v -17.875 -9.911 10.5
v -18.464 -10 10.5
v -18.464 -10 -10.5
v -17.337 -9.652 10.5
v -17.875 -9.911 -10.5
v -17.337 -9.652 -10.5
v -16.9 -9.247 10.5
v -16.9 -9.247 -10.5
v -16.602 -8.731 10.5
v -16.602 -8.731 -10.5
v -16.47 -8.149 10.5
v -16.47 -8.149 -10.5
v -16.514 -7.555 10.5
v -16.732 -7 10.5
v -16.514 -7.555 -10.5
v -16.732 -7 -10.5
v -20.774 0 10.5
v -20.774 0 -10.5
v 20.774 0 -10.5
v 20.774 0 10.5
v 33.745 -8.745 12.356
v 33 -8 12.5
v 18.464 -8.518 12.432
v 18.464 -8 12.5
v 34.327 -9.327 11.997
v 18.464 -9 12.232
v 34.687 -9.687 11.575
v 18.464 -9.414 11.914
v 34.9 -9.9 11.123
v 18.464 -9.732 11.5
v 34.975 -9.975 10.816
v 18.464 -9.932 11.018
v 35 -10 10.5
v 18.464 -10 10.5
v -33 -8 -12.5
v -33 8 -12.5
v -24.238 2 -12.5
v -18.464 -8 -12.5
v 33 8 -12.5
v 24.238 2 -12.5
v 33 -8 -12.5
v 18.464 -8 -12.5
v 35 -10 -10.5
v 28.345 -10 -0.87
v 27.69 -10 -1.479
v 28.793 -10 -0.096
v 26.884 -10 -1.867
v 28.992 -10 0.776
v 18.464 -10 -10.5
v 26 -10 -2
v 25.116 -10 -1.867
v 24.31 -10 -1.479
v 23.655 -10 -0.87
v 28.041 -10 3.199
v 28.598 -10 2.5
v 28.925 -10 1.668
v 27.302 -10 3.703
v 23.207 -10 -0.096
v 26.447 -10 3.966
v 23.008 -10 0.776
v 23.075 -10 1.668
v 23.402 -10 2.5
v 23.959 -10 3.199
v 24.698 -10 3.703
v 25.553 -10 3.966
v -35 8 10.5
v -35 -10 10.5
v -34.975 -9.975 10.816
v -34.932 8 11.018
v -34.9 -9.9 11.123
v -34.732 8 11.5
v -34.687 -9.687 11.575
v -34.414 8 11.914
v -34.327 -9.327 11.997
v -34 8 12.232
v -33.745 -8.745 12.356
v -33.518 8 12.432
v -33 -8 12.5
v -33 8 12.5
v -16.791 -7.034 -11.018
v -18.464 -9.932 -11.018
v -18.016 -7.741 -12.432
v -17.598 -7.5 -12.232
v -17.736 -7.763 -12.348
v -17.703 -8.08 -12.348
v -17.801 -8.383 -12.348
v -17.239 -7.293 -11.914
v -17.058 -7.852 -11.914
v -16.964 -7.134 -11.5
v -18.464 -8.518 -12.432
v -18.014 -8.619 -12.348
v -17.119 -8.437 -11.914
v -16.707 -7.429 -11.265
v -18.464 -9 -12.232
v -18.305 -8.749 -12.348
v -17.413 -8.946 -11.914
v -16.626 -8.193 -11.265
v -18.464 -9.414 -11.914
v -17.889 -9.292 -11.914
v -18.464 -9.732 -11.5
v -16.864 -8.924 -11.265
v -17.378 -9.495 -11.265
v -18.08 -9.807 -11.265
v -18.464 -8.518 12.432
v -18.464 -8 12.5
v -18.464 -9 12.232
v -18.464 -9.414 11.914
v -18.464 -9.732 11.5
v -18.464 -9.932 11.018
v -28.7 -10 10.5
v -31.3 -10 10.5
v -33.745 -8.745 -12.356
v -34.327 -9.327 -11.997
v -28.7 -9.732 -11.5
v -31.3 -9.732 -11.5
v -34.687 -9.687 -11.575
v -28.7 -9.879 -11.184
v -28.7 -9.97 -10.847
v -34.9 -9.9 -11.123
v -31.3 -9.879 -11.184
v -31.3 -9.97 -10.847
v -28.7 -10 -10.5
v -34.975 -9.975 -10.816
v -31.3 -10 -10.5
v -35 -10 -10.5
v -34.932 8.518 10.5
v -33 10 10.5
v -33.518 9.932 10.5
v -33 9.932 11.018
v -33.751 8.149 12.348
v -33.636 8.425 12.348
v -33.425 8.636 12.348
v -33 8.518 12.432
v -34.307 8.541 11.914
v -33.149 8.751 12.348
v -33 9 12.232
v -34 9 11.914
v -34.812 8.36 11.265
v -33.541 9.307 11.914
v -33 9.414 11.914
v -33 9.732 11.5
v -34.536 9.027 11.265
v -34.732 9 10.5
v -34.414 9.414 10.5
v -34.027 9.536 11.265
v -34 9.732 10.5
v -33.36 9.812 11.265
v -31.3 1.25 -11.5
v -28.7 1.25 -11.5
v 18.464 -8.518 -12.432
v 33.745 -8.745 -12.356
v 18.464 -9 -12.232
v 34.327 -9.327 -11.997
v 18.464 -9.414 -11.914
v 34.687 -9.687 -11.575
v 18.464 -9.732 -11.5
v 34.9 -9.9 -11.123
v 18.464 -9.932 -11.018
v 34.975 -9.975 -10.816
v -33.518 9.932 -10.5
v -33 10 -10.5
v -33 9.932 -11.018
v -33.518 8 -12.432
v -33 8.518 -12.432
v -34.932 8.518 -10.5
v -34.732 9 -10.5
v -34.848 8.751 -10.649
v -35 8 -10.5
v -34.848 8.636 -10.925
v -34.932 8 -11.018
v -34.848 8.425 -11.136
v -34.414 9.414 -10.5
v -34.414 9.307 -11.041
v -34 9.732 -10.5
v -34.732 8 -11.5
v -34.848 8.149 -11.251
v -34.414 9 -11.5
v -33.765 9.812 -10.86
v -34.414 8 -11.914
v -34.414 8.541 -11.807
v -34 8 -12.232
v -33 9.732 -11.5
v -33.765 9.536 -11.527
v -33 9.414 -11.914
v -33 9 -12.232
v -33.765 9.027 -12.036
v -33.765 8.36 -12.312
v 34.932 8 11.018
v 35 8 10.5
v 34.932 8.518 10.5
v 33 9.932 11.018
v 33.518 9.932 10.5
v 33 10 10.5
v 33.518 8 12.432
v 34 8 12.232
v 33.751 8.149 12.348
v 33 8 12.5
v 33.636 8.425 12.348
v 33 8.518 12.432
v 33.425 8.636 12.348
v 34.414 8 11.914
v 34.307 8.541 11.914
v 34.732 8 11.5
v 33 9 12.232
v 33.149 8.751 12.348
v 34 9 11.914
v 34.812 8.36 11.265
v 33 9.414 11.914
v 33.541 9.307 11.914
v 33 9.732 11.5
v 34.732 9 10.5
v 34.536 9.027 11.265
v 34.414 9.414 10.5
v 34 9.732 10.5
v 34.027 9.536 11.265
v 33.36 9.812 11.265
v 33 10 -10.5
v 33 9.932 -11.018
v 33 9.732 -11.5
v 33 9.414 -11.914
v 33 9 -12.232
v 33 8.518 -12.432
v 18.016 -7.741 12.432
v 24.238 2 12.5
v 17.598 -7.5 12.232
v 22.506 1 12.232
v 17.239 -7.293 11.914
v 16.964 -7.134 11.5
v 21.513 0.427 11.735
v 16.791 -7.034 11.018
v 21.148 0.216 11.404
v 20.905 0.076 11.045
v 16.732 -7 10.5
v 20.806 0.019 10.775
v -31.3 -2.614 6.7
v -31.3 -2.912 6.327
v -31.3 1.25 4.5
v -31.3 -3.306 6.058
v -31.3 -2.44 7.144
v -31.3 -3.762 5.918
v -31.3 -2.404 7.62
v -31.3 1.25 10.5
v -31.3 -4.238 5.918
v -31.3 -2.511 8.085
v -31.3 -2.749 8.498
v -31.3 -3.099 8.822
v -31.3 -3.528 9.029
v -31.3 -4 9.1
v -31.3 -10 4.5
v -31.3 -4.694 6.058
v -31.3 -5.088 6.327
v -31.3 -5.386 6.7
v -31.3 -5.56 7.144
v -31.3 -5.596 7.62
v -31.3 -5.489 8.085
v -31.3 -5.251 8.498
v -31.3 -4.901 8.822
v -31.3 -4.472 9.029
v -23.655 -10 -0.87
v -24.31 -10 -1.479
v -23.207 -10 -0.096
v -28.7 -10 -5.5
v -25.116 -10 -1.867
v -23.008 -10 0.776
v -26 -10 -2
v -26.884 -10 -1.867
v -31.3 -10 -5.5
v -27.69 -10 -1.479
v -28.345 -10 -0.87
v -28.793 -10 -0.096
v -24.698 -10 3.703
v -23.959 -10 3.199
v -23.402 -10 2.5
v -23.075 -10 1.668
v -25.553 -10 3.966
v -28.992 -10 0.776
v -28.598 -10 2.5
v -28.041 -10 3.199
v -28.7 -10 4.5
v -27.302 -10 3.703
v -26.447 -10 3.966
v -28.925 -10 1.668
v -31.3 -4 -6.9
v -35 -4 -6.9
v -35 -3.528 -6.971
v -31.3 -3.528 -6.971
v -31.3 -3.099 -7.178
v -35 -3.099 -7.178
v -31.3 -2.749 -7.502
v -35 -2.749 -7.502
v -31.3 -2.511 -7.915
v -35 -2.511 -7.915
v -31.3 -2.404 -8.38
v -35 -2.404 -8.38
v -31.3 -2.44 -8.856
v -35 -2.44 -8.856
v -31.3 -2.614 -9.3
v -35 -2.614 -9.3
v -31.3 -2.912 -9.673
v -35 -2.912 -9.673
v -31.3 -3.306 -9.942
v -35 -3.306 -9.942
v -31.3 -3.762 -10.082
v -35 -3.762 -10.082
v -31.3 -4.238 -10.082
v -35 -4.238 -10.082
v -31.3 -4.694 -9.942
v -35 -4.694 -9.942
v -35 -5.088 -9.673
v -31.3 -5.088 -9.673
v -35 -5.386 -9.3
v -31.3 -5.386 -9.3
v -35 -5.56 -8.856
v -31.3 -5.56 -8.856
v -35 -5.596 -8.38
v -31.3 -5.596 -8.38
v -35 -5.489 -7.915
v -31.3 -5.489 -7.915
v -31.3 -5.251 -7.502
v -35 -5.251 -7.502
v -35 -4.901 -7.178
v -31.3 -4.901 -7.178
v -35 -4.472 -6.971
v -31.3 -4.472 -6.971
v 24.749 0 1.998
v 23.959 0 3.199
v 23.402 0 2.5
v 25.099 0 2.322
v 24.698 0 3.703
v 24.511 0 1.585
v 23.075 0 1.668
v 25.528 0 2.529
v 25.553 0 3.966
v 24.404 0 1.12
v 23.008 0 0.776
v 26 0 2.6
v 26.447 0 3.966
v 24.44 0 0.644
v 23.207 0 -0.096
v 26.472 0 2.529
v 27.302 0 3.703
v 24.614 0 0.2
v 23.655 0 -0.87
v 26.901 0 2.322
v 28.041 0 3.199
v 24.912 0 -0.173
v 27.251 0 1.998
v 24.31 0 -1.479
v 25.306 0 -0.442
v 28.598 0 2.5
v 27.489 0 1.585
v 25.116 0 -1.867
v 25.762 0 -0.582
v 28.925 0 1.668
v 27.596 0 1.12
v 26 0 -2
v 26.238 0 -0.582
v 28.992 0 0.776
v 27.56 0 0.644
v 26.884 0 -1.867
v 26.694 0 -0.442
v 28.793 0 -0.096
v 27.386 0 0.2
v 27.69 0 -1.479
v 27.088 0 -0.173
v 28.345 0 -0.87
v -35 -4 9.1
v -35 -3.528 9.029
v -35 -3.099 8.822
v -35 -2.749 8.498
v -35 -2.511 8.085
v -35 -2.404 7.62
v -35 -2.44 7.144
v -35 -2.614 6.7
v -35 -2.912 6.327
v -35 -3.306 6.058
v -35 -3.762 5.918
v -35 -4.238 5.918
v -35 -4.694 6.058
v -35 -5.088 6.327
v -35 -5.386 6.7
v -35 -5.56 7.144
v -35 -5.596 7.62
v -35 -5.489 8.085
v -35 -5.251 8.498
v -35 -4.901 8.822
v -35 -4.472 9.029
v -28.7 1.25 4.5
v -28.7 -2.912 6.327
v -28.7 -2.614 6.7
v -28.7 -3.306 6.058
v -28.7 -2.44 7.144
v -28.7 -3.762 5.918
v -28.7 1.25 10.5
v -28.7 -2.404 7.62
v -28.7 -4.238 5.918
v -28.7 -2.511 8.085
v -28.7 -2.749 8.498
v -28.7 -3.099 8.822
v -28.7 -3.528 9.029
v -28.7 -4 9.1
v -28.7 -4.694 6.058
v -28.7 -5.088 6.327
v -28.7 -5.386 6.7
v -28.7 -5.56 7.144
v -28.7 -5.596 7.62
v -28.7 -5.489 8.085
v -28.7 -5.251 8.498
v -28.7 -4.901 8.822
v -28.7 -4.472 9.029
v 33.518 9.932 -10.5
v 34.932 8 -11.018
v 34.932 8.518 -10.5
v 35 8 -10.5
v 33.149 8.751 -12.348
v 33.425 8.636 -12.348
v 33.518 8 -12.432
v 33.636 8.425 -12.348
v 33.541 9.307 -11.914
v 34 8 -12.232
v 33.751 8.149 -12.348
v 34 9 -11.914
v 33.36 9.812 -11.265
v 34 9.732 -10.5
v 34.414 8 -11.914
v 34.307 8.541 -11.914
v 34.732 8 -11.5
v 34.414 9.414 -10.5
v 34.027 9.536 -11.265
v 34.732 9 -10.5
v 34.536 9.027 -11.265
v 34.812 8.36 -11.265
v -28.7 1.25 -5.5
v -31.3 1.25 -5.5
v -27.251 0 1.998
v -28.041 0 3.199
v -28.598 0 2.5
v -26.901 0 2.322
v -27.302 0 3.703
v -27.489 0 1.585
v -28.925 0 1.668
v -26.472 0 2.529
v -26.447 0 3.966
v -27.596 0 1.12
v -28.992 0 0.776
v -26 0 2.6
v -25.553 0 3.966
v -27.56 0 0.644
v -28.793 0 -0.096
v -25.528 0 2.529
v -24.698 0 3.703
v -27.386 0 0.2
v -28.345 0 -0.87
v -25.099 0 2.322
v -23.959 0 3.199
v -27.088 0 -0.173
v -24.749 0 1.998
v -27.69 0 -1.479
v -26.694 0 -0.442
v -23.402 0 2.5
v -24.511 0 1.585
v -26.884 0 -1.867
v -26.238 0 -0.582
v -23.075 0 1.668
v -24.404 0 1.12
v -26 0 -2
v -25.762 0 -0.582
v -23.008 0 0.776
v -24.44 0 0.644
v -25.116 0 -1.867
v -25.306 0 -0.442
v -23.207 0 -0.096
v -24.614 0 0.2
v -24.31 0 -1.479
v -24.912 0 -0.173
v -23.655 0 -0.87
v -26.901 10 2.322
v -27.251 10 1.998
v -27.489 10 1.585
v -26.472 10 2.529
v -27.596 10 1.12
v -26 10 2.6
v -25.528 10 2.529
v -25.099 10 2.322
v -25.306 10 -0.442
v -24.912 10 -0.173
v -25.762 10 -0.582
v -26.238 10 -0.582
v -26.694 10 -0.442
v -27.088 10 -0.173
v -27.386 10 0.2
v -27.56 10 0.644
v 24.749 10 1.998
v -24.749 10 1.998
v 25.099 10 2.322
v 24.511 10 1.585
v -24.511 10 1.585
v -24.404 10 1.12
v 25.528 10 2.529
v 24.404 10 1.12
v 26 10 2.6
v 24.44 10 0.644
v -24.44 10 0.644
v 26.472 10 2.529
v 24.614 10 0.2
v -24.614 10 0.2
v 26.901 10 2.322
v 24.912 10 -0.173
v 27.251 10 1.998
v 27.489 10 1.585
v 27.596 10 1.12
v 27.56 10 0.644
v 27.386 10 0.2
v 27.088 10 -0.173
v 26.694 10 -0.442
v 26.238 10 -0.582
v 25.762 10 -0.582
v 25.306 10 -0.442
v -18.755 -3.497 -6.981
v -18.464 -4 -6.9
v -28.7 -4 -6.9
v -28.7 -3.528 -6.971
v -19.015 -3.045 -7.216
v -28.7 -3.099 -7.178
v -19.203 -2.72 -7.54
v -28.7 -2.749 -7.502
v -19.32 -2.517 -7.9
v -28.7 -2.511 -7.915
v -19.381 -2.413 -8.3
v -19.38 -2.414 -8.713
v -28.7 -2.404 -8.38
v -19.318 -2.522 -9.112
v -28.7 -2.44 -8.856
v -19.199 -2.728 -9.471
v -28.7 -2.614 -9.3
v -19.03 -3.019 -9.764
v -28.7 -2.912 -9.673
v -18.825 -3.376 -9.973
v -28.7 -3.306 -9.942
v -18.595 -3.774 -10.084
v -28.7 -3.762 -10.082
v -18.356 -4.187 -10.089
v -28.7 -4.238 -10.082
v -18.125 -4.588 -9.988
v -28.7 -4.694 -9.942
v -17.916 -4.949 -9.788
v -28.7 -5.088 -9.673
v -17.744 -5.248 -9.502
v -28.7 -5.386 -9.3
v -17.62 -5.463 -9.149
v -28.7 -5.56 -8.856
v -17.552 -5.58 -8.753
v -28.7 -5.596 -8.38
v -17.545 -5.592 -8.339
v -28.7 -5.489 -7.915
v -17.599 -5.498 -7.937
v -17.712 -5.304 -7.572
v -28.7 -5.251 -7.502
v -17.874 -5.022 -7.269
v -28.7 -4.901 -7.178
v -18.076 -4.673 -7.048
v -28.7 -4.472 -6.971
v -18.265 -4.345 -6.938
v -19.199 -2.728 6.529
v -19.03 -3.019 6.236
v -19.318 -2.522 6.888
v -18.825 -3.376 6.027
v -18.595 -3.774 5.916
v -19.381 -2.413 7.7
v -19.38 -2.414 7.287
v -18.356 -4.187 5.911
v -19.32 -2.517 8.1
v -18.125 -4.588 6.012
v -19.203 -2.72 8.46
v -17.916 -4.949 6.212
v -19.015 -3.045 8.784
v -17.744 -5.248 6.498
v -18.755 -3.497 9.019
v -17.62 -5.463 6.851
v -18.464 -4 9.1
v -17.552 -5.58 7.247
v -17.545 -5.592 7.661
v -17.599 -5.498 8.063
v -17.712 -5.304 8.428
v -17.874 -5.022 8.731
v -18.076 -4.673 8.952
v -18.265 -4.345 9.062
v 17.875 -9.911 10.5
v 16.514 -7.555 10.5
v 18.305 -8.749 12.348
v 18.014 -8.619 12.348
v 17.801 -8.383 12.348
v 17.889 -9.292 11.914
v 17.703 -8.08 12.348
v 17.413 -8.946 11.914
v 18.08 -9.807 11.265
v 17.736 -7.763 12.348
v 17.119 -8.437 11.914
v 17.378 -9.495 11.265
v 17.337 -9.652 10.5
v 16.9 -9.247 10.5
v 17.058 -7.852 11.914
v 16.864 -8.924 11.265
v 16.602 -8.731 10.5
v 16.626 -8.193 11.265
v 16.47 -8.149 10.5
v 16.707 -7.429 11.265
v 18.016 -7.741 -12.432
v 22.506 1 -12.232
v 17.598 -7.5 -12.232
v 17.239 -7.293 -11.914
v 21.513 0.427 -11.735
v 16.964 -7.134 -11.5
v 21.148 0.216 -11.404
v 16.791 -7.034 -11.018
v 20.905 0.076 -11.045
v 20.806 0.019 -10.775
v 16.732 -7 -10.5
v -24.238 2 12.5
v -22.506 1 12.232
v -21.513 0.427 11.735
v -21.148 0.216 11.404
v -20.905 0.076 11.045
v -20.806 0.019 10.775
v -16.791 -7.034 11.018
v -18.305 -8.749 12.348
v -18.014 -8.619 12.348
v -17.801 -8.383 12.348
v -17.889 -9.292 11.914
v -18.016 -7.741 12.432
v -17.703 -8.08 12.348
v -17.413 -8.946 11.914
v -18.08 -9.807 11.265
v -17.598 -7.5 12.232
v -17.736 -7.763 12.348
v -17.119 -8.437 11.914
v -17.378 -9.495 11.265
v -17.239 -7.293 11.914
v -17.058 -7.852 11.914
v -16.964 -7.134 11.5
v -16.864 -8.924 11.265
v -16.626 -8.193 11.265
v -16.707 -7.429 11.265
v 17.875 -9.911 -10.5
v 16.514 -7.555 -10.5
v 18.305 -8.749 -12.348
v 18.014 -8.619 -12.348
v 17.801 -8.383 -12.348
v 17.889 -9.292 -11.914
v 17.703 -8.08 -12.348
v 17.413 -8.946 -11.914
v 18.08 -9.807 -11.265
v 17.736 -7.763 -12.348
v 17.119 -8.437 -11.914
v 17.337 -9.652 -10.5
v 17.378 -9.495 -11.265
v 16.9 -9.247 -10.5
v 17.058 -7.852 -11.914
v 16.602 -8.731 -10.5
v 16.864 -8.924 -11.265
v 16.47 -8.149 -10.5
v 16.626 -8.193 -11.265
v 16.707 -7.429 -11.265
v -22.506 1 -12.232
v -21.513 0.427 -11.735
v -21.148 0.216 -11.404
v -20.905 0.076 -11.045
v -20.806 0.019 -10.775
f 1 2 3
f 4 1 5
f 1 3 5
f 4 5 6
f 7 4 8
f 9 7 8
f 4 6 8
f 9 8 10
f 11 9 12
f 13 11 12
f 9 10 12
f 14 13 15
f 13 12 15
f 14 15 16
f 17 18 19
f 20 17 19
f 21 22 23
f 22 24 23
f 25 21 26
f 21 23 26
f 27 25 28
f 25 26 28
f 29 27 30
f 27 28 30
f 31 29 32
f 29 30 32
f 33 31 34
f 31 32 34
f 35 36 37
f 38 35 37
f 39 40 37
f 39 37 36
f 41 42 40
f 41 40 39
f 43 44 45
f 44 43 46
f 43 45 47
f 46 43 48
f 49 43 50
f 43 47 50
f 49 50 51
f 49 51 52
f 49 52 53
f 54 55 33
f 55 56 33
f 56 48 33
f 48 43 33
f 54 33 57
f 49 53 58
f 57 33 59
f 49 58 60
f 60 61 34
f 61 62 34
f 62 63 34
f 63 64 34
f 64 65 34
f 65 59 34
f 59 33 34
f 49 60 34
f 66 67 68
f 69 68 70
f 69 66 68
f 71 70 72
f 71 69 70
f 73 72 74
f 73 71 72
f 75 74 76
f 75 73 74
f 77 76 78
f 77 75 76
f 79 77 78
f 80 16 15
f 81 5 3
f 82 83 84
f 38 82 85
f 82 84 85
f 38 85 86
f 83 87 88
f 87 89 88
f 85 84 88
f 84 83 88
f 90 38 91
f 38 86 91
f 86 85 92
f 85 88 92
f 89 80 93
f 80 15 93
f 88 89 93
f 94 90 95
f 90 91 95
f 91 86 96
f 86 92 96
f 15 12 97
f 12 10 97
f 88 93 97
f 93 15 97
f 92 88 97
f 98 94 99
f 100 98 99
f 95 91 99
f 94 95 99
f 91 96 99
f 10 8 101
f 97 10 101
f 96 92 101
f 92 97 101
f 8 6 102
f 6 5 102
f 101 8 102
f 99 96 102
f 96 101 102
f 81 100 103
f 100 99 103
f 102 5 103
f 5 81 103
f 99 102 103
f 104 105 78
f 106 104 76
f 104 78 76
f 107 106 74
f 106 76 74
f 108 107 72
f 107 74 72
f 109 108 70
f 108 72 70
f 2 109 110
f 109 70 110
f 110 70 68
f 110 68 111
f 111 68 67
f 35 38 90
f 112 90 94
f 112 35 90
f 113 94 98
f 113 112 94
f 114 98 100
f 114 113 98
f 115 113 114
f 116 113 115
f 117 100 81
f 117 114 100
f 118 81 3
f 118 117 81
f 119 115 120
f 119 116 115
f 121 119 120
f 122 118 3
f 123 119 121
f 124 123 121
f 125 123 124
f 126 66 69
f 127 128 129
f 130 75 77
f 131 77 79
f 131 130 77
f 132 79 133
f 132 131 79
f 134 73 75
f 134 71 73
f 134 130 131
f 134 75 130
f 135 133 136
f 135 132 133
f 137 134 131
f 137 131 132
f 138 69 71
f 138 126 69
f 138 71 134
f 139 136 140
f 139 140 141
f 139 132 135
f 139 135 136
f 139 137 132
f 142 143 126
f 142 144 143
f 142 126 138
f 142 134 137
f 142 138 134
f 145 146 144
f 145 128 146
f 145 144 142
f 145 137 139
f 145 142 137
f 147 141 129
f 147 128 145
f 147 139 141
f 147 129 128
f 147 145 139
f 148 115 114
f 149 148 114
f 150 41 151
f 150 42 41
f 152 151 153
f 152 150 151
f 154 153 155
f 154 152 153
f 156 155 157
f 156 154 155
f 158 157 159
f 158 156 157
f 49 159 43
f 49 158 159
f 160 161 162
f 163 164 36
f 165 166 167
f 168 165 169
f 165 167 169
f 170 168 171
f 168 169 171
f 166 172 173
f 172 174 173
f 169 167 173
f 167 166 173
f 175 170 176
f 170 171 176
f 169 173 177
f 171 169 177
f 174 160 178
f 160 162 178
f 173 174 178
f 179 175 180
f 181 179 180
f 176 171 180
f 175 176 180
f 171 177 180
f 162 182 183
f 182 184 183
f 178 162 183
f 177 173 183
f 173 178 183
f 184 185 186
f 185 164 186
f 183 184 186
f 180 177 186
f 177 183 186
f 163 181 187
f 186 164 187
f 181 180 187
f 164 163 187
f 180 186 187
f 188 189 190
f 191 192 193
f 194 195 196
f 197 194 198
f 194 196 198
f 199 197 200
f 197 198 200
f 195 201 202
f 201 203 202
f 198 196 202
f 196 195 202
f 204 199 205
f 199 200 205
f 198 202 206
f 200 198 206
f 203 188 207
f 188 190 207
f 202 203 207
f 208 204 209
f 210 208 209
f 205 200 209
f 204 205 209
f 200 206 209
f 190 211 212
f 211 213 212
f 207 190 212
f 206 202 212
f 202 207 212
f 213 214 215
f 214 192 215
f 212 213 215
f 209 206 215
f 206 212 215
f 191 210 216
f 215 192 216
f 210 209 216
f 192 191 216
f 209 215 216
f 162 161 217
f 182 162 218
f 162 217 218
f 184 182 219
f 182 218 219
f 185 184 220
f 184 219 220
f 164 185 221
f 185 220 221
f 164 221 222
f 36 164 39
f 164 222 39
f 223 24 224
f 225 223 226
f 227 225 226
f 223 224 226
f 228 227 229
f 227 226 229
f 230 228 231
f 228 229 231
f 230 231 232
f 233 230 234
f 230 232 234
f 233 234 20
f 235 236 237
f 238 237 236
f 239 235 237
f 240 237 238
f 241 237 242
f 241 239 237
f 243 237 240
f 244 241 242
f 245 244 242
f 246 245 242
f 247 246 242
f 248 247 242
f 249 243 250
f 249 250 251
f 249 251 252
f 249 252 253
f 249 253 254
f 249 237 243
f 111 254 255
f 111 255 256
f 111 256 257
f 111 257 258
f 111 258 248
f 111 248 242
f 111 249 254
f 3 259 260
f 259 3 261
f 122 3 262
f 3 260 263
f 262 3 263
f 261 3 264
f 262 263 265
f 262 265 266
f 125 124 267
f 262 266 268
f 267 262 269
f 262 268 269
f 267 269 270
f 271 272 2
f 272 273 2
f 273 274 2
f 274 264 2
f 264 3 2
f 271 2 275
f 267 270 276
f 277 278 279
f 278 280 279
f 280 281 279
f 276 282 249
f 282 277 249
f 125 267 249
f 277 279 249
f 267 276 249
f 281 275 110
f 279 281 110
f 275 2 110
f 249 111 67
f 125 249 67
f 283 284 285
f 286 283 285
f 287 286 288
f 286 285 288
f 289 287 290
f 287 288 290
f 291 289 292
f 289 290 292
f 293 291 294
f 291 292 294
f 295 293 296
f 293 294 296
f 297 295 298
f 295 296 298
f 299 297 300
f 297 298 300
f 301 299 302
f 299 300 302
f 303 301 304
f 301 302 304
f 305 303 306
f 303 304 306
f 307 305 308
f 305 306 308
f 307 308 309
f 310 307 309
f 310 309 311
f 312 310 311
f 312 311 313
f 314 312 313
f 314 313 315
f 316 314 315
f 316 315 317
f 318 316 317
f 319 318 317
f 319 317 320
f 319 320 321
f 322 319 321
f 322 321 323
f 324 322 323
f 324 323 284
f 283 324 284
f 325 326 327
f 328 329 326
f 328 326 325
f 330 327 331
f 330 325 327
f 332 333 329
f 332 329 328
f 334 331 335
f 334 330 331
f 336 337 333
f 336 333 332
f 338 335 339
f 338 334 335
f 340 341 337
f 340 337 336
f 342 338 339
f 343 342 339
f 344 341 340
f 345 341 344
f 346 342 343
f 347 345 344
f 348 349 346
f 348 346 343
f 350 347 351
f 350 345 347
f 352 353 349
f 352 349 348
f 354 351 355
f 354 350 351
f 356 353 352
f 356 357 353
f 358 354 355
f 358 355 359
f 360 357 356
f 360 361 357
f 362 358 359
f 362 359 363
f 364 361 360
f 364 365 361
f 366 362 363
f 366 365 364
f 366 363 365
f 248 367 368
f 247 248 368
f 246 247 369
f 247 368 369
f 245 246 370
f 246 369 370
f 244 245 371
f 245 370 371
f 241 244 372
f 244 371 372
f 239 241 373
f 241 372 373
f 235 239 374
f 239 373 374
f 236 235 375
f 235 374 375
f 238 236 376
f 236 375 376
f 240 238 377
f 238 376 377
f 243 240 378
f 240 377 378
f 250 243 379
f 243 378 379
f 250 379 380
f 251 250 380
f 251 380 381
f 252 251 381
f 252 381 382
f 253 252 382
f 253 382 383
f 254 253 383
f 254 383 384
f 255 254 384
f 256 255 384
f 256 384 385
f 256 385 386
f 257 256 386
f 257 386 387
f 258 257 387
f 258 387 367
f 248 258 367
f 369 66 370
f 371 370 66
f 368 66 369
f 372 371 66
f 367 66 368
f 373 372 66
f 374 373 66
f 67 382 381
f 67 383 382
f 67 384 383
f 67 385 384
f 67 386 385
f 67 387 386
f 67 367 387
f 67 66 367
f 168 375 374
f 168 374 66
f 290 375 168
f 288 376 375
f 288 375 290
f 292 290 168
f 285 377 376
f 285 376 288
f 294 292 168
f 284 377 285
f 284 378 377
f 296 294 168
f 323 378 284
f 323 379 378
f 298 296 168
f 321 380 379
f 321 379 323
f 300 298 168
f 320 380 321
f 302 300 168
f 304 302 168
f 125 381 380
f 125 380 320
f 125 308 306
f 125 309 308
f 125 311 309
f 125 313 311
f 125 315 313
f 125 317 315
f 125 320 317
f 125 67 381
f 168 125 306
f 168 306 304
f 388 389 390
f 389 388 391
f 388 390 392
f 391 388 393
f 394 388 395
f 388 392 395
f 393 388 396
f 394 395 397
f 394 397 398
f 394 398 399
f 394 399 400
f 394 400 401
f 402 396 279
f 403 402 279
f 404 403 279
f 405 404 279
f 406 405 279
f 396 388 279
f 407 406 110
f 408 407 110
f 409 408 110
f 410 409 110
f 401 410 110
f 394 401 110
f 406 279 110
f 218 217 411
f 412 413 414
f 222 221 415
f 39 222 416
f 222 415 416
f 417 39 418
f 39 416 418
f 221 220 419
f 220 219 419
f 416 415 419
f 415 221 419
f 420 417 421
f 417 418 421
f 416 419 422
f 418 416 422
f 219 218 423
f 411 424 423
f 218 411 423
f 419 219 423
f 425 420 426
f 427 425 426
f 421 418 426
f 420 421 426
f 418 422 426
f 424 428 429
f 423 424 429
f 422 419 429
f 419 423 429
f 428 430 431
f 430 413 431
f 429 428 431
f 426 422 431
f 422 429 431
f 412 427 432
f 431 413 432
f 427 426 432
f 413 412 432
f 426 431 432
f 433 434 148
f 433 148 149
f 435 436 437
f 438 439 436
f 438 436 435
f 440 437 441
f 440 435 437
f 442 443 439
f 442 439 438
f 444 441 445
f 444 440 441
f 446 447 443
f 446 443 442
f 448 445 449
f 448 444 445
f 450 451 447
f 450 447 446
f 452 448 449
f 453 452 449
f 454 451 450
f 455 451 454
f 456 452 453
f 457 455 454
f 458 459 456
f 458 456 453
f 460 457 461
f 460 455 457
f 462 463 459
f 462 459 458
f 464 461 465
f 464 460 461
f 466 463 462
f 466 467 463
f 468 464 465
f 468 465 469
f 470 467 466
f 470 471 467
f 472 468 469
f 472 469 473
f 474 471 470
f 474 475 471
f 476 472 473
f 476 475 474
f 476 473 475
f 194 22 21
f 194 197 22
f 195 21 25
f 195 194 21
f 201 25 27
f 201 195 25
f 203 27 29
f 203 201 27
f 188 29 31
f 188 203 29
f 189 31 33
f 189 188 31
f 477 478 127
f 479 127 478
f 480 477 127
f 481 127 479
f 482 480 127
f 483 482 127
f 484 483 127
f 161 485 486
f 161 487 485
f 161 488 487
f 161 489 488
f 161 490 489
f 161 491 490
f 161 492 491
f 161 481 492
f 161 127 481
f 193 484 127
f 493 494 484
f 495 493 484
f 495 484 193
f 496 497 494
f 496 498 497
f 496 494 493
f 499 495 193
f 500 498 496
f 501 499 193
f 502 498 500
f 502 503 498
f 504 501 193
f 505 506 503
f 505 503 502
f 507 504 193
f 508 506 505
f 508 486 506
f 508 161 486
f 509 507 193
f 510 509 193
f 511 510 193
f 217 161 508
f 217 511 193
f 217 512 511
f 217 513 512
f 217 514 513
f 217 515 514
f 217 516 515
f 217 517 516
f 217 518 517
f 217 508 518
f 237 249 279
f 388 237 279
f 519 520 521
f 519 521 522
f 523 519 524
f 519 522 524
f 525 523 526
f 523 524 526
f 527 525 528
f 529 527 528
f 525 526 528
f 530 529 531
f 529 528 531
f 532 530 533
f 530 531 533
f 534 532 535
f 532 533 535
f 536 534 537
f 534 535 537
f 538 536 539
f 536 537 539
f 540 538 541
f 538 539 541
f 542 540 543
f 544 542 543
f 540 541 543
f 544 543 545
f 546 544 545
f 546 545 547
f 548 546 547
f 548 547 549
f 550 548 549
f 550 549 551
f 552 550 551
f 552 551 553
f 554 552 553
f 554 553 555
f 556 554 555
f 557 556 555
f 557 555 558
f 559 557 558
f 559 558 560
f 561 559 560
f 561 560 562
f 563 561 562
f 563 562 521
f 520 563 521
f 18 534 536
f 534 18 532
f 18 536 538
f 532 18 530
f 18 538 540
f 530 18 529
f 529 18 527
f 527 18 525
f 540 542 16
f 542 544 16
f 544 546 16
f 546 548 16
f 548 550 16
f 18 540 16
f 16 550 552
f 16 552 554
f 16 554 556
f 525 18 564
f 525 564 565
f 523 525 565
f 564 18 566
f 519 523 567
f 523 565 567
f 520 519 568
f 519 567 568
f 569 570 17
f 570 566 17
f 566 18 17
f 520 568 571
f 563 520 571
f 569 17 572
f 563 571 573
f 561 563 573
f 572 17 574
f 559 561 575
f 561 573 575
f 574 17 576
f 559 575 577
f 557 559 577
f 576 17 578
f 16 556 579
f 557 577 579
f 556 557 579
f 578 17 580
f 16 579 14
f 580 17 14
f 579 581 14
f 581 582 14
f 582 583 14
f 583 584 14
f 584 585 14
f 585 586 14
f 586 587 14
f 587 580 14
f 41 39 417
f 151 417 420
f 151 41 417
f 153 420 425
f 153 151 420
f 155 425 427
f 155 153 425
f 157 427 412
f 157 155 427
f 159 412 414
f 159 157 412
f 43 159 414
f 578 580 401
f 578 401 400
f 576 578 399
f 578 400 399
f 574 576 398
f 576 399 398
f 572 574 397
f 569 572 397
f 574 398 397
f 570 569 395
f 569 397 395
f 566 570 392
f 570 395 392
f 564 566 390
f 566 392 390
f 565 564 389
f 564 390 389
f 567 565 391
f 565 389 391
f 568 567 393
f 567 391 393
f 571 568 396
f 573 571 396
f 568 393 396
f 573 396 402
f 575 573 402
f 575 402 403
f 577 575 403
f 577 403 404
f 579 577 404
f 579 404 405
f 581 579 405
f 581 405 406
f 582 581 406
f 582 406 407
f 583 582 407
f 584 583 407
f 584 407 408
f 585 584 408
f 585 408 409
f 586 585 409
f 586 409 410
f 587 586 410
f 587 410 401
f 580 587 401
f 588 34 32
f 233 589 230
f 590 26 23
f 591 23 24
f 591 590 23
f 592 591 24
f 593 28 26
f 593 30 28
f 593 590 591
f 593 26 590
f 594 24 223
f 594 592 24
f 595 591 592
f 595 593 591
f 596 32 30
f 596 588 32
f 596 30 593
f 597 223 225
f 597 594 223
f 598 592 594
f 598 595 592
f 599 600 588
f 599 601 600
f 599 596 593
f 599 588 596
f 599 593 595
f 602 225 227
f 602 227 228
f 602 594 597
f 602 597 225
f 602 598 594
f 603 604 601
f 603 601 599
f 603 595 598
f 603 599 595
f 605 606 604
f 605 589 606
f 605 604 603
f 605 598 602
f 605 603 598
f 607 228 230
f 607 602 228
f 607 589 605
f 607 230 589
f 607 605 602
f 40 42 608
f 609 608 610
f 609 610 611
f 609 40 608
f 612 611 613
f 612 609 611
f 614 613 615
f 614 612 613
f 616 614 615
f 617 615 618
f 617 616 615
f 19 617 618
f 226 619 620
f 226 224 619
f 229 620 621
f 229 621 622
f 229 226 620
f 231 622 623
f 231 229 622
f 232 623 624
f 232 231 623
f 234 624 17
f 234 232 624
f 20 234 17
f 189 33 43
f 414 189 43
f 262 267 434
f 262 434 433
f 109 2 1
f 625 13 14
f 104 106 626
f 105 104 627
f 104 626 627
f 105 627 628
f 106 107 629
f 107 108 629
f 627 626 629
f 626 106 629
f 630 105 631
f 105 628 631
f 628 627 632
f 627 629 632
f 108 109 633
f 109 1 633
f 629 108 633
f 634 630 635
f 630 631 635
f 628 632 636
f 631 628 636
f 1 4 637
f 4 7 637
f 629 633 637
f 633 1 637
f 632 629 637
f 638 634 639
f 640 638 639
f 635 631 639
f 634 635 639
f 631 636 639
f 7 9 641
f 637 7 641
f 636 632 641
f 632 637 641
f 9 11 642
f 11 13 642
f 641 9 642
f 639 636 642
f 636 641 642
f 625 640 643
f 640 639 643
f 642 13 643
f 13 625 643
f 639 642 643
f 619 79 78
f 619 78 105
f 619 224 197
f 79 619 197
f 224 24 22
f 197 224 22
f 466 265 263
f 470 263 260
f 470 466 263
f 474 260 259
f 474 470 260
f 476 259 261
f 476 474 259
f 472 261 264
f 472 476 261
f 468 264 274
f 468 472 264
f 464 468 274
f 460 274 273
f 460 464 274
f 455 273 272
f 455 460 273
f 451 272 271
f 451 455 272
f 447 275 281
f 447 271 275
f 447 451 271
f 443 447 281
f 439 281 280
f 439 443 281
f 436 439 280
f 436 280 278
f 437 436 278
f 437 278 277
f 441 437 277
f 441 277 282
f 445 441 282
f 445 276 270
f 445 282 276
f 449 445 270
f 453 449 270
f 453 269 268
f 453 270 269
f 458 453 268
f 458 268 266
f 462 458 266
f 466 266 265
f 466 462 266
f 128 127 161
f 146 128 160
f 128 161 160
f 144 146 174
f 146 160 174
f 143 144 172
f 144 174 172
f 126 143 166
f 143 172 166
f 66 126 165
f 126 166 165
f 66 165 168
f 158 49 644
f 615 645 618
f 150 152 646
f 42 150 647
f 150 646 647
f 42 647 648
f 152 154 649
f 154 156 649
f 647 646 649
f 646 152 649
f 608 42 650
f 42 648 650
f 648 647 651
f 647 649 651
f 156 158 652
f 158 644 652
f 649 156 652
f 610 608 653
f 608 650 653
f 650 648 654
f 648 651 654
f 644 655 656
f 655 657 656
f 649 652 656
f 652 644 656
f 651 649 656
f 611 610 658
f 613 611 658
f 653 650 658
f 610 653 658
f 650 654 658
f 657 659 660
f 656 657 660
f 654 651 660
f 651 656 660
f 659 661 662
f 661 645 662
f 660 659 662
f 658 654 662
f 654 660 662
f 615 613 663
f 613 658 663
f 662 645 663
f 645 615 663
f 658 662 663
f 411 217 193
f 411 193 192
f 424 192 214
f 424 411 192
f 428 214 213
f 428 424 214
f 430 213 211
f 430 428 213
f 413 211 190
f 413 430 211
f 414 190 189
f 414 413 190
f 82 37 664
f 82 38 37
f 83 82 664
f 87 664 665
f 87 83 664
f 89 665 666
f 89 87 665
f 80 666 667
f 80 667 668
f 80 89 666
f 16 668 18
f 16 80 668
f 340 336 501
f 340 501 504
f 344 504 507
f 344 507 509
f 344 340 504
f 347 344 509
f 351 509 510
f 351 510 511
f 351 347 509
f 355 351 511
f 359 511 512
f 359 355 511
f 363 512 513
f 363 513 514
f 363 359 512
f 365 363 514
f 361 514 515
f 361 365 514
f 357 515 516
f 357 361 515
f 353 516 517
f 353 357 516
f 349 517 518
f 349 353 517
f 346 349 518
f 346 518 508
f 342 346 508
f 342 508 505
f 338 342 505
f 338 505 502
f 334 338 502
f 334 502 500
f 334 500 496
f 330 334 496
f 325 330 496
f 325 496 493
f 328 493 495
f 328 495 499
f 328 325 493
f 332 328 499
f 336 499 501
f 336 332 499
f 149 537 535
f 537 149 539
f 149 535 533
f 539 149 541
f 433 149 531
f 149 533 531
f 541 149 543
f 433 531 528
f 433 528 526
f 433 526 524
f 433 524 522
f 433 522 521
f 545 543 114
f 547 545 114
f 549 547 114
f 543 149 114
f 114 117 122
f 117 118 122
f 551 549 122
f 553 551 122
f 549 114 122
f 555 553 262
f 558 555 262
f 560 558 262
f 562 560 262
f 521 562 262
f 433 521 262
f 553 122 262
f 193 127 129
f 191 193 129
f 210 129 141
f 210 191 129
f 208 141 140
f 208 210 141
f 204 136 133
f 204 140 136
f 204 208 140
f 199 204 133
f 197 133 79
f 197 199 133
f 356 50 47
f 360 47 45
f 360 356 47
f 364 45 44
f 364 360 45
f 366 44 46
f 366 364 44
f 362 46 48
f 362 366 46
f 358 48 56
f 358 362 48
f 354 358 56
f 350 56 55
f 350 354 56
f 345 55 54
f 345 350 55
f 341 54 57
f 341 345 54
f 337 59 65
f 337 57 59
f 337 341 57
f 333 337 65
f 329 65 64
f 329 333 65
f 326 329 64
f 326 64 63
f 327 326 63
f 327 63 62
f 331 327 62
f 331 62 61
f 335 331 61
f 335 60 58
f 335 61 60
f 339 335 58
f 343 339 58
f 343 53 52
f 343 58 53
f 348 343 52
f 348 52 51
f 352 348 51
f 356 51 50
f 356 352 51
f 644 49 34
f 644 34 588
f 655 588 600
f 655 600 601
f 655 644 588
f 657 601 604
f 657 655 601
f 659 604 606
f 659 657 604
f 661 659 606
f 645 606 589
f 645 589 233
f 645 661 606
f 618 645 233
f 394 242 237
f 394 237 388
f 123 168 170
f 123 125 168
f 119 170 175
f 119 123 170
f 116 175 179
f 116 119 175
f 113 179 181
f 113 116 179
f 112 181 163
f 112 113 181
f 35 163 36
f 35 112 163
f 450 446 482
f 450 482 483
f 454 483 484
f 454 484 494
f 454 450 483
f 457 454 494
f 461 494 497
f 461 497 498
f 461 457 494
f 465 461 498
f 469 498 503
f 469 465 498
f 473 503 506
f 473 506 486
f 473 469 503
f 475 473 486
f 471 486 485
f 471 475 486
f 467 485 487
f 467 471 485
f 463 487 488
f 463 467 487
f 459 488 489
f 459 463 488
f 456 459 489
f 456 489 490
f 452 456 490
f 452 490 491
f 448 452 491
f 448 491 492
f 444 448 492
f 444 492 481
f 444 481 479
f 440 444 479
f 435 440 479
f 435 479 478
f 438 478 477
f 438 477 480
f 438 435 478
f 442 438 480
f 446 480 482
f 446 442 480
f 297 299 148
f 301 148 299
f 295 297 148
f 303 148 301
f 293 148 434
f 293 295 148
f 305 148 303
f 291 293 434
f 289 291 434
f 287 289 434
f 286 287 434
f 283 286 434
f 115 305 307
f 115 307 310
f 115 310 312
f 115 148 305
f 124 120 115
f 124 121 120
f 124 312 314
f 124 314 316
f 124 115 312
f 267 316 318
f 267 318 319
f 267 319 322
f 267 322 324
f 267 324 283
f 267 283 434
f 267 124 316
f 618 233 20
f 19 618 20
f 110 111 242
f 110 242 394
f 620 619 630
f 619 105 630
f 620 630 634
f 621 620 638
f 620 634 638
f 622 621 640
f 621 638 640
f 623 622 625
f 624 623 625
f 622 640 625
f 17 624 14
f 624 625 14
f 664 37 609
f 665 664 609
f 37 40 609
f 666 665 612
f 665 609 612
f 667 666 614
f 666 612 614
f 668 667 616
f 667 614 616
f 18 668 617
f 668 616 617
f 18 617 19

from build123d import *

# Parameters (mm, degrees)
SKETCH1_W           = 70
SKETCH1_H           = 25
SKETCH1_R           = 1.6
BOSS_EXTRUDE1_DEPTH = 10
BOSS_EXTRUDE2_DEPTH = 25
SKETCH3_R           = 3
CUT_EXTRUDE1_DEPTH  = 39.487010796
FILLET1_R           = 2
SKETCH6_R           = 1.6
CUT_EXTRUDE3_DEPTH  = 27
SKETCH7_W           = 2.6
SKETCH7_H           = 6
CUT_EXTRUDE4_DEPTH  = 11.25


with BuildPart() as part:
    # Sketch1 → Boss-Extrude1 (new body)
    with BuildSketch(Plane(origin=(0, 0, 0), x_dir=(1, 0, 0), z_dir=(0, 1, 0))):
        Rectangle(SKETCH1_W, SKETCH1_H)
        with Locations(Location((-26, -1, 0), (0, 0, 270))):
            Circle(SKETCH1_R, mode=Mode.SUBTRACT)
        with Locations(Location((26, -1, 0), (0, 0, 270))):
            Circle(SKETCH1_R, mode=Mode.SUBTRACT)
    extrude(amount=BOSS_EXTRUDE1_DEPTH)

    # Sketch2 → Boss-Extrude2 (add)
    with BuildSketch(Plane.XY.offset(12.5)):
        Polygon((-35, 0), (-20.773502692, 0), (-15, -10), (-35, -10), align=None)
        Polygon((35, 0), (35, -10), (15, -10), (20.773502692, 0), align=None)
    extrude(amount=-BOSS_EXTRUDE2_DEPTH)

    # Sketch3 → Cut-Extrude1 (cut, through all)
    with BuildSketch(Plane.XZ):
        with Locations(Location((-26, 1, 0), (0, 0, 270))):
            Circle(SKETCH3_R)
        with Locations(Location((26, 1, 0), (0, 0, 270))):
            Circle(SKETCH3_R)
    extrude(amount=CUT_EXTRUDE1_DEPTH, mode=Mode.SUBTRACT)

    # Fillet1
    fillet1_edges = [part.edges().sort_by_distance(p)[0] for p in [
        (35, 10, 0),
        (0, 10, -12.5),
        (0, 0, -12.5),
        (0, 0, 12.5),
        (-17.886751346, -5, -12.5),
        (-25, -10, -12.5),
        (-15, -10, 0),
        (-25, -10, 12.5),
        (-17.886751346, -5, 12.5),
        (25, -10, -12.5),
        (17.886751346, -5, -12.5),
        (15, -10, 0),
        (25, -10, 12.5),
        (17.886751346, -5, 12.5),
        (-35, 10, 0),
        (-35, 0, -12.5),
        (35, 0, -12.5),
        (35, 0, 12.5),
        (-35, 0, 12.5),
        (0, 10, 12.5),
    ]]
    fillet(fillet1_edges, radius=FILLET1_R)

    # Sketch6 → Cut-Extrude3 (cut)
    with BuildSketch(Plane.ZY.offset(35)):
        with Locations((-8.5, -4)):
            Circle(SKETCH6_R)
        with Locations((7.5, -4)):
            Circle(SKETCH6_R)
    extrude(amount=-CUT_EXTRUDE3_DEPTH, mode=Mode.SUBTRACT)

    # Sketch7 → Cut-Extrude4 (cut)
    with BuildSketch(Plane.XZ.offset(10)):
        with Locations((-30, -8.5)):
            Rectangle(SKETCH7_W, SKETCH7_H)
        with Locations((-30, 7.5)):
            Rectangle(SKETCH7_W, SKETCH7_H)
    extrude(amount=-CUT_EXTRUDE4_DEPTH, mode=Mode.SUBTRACT)


solid = part.part
